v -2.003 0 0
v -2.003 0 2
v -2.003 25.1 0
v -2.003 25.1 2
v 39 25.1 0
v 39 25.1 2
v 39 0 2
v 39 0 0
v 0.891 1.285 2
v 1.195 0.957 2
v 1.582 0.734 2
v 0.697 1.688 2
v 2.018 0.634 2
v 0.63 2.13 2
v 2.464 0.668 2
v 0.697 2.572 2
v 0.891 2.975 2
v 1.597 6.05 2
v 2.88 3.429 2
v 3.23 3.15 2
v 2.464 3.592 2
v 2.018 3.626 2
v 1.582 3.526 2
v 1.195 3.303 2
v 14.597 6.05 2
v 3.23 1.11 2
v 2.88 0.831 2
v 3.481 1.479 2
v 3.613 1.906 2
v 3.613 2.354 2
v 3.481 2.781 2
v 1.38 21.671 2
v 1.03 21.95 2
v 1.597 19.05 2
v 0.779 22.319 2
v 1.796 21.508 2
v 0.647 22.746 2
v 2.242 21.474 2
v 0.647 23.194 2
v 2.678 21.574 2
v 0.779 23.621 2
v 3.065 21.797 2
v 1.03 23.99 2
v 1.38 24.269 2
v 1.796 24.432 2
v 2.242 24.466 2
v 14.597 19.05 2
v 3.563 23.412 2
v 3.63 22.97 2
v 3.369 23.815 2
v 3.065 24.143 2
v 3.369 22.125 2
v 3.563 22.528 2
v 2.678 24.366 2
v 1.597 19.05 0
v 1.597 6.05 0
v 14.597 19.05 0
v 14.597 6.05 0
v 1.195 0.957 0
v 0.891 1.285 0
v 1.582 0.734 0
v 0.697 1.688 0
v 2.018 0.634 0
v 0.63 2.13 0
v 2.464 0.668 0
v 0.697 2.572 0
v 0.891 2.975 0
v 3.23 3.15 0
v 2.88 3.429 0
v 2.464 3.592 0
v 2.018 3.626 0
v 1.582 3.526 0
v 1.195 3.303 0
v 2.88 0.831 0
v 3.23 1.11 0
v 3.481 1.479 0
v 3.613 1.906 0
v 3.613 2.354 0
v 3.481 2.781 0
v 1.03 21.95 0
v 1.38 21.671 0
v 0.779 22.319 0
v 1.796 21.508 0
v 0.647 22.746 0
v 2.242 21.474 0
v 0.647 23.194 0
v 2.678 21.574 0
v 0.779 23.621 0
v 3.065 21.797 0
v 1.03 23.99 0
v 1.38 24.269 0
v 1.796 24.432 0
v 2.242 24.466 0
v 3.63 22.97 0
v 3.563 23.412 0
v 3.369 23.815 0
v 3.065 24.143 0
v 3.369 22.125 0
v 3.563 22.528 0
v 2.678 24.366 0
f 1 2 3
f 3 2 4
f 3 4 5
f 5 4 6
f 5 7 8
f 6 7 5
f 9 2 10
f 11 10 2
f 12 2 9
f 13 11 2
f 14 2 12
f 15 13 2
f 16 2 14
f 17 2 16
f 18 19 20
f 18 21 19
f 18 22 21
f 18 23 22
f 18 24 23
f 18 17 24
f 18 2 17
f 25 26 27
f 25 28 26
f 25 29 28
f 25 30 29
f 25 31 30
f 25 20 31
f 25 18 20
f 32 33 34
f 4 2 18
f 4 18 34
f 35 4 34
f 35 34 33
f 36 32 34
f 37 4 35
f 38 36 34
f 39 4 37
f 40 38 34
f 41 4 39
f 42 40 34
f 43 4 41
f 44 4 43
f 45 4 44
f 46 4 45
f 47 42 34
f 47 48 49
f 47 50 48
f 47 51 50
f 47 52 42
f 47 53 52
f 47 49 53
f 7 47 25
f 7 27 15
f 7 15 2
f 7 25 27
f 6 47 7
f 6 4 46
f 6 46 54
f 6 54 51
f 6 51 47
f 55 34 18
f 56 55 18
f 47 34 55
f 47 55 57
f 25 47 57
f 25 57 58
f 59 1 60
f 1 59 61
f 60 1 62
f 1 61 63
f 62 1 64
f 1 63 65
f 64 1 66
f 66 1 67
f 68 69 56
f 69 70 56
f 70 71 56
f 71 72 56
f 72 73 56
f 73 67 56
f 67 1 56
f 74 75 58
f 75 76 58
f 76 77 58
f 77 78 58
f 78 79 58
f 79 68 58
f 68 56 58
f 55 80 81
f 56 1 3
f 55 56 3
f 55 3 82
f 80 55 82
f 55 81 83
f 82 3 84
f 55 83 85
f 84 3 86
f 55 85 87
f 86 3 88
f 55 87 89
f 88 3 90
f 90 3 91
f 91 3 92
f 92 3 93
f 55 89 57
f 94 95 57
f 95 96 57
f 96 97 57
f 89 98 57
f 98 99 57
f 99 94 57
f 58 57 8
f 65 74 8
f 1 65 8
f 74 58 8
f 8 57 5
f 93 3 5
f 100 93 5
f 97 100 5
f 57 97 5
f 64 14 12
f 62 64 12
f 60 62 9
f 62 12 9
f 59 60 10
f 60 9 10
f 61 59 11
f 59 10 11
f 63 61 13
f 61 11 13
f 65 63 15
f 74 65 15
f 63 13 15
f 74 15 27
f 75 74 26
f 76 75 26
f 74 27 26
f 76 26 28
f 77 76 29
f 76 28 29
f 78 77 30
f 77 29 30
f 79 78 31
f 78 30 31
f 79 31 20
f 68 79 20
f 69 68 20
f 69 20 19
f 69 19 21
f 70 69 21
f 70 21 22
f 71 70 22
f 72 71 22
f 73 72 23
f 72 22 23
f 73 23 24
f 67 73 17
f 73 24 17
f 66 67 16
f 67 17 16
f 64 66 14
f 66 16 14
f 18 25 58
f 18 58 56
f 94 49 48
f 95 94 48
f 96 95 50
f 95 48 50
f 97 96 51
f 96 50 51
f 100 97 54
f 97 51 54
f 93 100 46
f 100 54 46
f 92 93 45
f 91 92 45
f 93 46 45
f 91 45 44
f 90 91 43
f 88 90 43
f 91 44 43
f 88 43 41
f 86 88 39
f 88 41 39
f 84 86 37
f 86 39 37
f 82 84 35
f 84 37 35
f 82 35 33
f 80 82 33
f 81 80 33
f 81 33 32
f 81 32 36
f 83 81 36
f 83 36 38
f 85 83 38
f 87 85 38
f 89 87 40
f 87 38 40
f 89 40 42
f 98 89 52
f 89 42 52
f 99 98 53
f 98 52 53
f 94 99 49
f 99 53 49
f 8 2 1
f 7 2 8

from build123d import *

# Parameters (mm, degrees)
ESBO_O1_W                = 35
ESBO_O1_H                = 25.1
RESSALTO_EXTRUS_O1_DEPTH = 2
ESBO_O2_R                = 1.5
CORTE_EXTRUS_O1_DEPTH    = 2
ESBO_O3_W                = 2.002857319
ESBO_O3_H                = 25.1
RESSALTO_EXTRUS_O2_DEPTH = 2
CORTE_EXTRUS_O2_DEPTH    = 2
ESBO_O5_W                = 4
ESBO_O5_H                = 25.1
RESSALTO_EXTRUS_O3_DEPTH = 2


with BuildPart() as part:
    # Esboço1 → Ressalto-extrusão1 (new body)
    with BuildSketch(Plane.XY):
        with Locations((17.5, 12.55)):
            Rectangle(ESBO_O1_W, ESBO_O1_H)
    extrude(amount=RESSALTO_EXTRUS_O1_DEPTH)

    # Esboço2 → Corte-extrusão1 (cut)
    with BuildSketch(Plane.XY.offset(2)):
        with Locations((2.13, 22.97)):
            Circle(ESBO_O2_R)
        with Locations(Location((2.13, 2.13, 0), (0, 0, 180))):
            Circle(ESBO_O2_R)
    extrude(amount=-CORTE_EXTRUS_O1_DEPTH, mode=Mode.SUBTRACT)

    # Esboço3 → Ressalto-extrusão2 (add)
    with BuildSketch(Plane.XY.offset(2)):
        with Locations((-1.00142866, 12.55)):
            Rectangle(ESBO_O3_W, ESBO_O3_H)
    extrude(amount=-RESSALTO_EXTRUS_O2_DEPTH)

    # Esboço4 → Corte-extrusão2 (cut)
    with BuildSketch(Plane.XY.offset(2)):
        Polygon((1.597142681, 12.55), (1.597142681, 19.05), (14.597142681, 19.05), (14.597142681, 6.05), (1.597142681, 6.05), align=None)
    extrude(amount=-CORTE_EXTRUS_O2_DEPTH, mode=Mode.SUBTRACT)

    # Esboço5 → Ressalto-extrusão3 (add)
    with BuildSketch(Plane.XY.offset(2)):
        with Locations((37, 12.55)):
            Rectangle(ESBO_O5_W, ESBO_O5_H)
    extrude(amount=-RESSALTO_EXTRUS_O3_DEPTH)


solid = part.part
